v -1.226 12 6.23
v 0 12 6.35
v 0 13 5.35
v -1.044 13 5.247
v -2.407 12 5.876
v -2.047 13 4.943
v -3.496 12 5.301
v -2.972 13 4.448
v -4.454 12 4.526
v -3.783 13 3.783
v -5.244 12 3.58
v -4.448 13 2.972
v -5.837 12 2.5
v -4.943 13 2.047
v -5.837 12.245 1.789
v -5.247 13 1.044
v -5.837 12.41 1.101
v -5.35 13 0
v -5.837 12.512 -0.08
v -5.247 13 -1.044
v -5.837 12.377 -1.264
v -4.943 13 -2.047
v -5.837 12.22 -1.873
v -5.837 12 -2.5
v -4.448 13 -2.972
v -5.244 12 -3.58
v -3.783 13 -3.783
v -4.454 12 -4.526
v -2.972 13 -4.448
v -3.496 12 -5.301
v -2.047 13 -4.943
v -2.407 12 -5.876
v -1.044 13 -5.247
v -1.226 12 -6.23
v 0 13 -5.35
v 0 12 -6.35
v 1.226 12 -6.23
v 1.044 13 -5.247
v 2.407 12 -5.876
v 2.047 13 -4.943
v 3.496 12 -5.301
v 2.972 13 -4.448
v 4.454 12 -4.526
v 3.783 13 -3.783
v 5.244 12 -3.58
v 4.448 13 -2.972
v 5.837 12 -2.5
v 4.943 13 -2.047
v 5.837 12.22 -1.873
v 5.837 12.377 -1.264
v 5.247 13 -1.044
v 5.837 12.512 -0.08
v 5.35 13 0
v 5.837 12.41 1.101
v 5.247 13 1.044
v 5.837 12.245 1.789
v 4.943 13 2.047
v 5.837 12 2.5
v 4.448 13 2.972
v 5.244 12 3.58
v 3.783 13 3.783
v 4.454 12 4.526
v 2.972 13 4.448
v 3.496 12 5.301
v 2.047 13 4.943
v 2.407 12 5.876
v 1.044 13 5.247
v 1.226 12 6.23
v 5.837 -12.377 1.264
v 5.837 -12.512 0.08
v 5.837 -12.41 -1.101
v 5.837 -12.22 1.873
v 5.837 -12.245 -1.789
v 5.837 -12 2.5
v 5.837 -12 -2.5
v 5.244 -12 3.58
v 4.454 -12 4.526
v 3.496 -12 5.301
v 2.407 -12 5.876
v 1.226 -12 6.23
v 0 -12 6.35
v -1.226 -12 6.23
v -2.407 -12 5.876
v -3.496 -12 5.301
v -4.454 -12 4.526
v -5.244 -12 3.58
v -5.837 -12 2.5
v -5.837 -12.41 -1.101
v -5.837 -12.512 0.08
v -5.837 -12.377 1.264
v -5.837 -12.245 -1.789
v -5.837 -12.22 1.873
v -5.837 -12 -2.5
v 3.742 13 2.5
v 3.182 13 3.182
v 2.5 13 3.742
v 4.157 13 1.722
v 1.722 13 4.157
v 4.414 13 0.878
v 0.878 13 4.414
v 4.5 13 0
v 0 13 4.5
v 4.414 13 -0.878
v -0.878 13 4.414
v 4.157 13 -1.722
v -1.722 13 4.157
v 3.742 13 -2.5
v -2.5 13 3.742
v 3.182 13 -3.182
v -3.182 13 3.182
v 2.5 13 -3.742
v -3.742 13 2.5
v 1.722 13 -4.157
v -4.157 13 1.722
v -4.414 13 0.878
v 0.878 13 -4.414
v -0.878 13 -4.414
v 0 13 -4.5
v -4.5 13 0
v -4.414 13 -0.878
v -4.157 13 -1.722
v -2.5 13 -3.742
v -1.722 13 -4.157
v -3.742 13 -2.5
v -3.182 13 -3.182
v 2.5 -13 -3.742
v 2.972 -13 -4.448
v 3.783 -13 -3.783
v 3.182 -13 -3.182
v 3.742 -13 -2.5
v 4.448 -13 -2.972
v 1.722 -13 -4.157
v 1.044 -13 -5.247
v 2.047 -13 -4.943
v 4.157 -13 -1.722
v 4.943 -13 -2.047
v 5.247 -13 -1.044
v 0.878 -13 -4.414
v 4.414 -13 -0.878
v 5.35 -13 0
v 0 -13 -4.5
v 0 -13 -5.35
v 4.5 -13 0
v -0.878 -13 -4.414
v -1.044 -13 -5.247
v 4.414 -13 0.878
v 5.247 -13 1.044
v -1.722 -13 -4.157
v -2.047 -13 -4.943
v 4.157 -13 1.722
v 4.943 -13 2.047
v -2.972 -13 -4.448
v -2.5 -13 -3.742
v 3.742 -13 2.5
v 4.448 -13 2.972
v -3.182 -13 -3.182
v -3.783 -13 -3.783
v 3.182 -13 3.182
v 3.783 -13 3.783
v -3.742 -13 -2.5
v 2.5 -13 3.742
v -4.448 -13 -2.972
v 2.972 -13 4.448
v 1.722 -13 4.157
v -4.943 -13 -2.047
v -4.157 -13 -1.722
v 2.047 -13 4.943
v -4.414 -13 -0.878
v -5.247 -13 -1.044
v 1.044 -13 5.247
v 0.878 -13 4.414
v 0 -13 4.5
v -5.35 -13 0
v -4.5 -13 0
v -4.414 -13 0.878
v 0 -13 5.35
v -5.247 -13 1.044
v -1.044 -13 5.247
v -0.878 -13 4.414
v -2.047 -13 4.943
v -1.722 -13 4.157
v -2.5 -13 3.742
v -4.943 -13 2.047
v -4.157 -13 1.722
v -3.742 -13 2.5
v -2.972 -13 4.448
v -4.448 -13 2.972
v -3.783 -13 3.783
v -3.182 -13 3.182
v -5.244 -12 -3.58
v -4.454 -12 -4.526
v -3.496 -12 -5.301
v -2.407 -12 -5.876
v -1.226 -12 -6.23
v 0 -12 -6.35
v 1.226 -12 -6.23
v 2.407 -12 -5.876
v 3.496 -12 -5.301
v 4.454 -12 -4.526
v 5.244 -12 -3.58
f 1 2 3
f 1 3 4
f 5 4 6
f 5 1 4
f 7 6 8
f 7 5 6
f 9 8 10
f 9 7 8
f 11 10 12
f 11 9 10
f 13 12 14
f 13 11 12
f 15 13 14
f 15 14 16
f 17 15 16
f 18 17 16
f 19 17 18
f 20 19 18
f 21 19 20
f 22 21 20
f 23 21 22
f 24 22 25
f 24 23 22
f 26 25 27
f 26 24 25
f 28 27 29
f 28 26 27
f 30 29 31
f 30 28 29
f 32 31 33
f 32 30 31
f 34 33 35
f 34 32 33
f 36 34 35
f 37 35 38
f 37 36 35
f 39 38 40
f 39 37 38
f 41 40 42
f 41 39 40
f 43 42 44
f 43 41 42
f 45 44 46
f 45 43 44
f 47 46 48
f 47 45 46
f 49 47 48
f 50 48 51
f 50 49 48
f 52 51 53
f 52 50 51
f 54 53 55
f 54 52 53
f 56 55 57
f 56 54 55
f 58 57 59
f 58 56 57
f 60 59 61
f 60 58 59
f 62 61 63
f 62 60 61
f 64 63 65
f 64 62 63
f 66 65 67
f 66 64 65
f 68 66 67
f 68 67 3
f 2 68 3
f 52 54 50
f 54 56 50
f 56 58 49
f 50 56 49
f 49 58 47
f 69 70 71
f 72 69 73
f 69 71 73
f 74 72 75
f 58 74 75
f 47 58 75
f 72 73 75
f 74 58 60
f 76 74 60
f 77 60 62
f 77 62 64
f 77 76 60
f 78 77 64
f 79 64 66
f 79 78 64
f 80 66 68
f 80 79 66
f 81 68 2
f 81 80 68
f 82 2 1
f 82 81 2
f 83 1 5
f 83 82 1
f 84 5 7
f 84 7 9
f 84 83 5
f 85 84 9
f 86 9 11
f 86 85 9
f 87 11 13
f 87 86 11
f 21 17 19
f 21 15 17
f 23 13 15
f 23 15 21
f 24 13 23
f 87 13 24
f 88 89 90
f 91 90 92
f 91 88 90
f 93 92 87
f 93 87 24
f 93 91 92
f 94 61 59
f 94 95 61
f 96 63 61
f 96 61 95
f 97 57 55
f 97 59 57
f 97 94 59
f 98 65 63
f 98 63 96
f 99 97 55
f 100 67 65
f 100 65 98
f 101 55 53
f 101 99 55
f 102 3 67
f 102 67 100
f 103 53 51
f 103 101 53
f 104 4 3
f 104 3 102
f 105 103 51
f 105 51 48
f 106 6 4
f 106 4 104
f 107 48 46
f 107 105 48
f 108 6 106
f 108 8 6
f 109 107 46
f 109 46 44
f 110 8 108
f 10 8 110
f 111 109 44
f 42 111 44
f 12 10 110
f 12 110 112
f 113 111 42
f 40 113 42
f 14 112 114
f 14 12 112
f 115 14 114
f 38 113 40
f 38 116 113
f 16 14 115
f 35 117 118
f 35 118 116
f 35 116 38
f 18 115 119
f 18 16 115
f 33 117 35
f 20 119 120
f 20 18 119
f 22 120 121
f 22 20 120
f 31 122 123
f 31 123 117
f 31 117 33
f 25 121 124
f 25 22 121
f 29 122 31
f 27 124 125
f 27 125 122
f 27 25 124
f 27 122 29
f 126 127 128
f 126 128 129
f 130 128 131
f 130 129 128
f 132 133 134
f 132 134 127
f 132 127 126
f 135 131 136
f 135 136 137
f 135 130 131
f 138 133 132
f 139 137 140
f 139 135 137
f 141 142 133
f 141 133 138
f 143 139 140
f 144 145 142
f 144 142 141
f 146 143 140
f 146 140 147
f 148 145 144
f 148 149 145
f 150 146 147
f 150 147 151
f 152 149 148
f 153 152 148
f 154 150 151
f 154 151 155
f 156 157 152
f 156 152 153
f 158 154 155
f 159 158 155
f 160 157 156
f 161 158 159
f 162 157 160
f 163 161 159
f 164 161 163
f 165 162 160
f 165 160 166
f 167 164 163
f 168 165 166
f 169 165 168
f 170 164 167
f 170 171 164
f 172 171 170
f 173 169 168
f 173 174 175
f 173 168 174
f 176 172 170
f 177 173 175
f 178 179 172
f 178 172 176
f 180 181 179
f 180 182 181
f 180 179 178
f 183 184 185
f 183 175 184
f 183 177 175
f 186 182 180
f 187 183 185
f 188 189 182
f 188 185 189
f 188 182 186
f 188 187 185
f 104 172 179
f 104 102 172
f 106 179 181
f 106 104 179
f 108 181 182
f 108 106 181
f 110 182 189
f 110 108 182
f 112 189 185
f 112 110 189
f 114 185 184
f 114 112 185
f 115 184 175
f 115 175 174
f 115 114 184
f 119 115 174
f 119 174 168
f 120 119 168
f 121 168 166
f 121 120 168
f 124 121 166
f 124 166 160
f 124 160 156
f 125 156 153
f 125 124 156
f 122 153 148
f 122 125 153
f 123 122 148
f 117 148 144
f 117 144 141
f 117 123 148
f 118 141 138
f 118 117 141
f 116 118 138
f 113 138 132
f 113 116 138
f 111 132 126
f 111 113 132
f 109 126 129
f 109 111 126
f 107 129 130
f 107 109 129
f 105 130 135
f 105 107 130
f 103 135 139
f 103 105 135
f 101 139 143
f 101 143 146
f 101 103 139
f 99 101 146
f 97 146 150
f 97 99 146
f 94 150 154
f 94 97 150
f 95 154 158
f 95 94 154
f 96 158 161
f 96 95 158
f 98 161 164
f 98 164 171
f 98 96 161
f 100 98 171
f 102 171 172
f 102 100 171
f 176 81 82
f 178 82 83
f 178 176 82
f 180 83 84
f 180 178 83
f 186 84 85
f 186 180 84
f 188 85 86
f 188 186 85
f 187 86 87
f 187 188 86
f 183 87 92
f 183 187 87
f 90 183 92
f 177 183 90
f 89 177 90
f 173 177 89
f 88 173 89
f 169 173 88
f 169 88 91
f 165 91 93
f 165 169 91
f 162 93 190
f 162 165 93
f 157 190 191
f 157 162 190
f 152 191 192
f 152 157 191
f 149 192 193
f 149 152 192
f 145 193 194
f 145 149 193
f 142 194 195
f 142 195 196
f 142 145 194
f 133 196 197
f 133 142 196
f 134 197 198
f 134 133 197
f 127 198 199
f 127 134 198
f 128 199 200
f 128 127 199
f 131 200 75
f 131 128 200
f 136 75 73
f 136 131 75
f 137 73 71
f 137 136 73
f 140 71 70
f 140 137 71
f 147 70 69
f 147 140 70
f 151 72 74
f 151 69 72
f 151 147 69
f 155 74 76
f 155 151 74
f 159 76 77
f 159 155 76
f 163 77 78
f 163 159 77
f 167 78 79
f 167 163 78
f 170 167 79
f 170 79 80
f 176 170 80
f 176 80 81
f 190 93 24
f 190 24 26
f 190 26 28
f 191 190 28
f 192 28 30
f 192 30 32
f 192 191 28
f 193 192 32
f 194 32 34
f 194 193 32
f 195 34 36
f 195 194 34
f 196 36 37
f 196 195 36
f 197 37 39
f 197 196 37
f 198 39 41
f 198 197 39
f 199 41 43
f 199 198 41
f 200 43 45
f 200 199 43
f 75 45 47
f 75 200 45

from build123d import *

# Parameters (mm, degrees)
CUT_EXTRUDE1_DEPTH      = 16.800158227
CUT_EXTRUDE1_DEPTH_BACK = 16.800158227
SKETCH2_W               = 6.200894729
SKETCH2_H               = 5
SKETCH2_W_2             = 7.80745867


with BuildPart() as part:
    # Sketch1 → Revolve1 (revolve)
    with BuildSketch(Plane.XY, mode=Mode.PRIVATE) as revolve1_sk:
        Polygon((-4.5, 13), (-5.35, 13), (-6.35, 12), (-6.35, -12), (-5.35, -13), (-4.5, -13), align=None)
    revolve(revolve1_sk.sketch.rotate(Axis((0, 18.016627358, 0), (0, -1, 0)), 270), axis=Axis((0, 18.016627358, 0), (0, -1, 0)))

    # Sketch2 → Cut-Extrude1 (cut, two sides: drawn at the far end of the back side and taken through both)
    with BuildSketch(Plane(origin=(0, 0, 0), x_dir=(1, 0, 0), z_dir=(0, 1, 0)).offset(-CUT_EXTRUDE1_DEPTH_BACK)):
        with Locations((-8.937612772, 0)):
            Rectangle(SKETCH2_W, SKETCH2_H)
        with Locations((9.740894743, 0)):
            Rectangle(SKETCH2_W_2, SKETCH2_H)
    extrude(amount=CUT_EXTRUDE1_DEPTH + CUT_EXTRUDE1_DEPTH_BACK, mode=Mode.SUBTRACT)


solid = part.part
